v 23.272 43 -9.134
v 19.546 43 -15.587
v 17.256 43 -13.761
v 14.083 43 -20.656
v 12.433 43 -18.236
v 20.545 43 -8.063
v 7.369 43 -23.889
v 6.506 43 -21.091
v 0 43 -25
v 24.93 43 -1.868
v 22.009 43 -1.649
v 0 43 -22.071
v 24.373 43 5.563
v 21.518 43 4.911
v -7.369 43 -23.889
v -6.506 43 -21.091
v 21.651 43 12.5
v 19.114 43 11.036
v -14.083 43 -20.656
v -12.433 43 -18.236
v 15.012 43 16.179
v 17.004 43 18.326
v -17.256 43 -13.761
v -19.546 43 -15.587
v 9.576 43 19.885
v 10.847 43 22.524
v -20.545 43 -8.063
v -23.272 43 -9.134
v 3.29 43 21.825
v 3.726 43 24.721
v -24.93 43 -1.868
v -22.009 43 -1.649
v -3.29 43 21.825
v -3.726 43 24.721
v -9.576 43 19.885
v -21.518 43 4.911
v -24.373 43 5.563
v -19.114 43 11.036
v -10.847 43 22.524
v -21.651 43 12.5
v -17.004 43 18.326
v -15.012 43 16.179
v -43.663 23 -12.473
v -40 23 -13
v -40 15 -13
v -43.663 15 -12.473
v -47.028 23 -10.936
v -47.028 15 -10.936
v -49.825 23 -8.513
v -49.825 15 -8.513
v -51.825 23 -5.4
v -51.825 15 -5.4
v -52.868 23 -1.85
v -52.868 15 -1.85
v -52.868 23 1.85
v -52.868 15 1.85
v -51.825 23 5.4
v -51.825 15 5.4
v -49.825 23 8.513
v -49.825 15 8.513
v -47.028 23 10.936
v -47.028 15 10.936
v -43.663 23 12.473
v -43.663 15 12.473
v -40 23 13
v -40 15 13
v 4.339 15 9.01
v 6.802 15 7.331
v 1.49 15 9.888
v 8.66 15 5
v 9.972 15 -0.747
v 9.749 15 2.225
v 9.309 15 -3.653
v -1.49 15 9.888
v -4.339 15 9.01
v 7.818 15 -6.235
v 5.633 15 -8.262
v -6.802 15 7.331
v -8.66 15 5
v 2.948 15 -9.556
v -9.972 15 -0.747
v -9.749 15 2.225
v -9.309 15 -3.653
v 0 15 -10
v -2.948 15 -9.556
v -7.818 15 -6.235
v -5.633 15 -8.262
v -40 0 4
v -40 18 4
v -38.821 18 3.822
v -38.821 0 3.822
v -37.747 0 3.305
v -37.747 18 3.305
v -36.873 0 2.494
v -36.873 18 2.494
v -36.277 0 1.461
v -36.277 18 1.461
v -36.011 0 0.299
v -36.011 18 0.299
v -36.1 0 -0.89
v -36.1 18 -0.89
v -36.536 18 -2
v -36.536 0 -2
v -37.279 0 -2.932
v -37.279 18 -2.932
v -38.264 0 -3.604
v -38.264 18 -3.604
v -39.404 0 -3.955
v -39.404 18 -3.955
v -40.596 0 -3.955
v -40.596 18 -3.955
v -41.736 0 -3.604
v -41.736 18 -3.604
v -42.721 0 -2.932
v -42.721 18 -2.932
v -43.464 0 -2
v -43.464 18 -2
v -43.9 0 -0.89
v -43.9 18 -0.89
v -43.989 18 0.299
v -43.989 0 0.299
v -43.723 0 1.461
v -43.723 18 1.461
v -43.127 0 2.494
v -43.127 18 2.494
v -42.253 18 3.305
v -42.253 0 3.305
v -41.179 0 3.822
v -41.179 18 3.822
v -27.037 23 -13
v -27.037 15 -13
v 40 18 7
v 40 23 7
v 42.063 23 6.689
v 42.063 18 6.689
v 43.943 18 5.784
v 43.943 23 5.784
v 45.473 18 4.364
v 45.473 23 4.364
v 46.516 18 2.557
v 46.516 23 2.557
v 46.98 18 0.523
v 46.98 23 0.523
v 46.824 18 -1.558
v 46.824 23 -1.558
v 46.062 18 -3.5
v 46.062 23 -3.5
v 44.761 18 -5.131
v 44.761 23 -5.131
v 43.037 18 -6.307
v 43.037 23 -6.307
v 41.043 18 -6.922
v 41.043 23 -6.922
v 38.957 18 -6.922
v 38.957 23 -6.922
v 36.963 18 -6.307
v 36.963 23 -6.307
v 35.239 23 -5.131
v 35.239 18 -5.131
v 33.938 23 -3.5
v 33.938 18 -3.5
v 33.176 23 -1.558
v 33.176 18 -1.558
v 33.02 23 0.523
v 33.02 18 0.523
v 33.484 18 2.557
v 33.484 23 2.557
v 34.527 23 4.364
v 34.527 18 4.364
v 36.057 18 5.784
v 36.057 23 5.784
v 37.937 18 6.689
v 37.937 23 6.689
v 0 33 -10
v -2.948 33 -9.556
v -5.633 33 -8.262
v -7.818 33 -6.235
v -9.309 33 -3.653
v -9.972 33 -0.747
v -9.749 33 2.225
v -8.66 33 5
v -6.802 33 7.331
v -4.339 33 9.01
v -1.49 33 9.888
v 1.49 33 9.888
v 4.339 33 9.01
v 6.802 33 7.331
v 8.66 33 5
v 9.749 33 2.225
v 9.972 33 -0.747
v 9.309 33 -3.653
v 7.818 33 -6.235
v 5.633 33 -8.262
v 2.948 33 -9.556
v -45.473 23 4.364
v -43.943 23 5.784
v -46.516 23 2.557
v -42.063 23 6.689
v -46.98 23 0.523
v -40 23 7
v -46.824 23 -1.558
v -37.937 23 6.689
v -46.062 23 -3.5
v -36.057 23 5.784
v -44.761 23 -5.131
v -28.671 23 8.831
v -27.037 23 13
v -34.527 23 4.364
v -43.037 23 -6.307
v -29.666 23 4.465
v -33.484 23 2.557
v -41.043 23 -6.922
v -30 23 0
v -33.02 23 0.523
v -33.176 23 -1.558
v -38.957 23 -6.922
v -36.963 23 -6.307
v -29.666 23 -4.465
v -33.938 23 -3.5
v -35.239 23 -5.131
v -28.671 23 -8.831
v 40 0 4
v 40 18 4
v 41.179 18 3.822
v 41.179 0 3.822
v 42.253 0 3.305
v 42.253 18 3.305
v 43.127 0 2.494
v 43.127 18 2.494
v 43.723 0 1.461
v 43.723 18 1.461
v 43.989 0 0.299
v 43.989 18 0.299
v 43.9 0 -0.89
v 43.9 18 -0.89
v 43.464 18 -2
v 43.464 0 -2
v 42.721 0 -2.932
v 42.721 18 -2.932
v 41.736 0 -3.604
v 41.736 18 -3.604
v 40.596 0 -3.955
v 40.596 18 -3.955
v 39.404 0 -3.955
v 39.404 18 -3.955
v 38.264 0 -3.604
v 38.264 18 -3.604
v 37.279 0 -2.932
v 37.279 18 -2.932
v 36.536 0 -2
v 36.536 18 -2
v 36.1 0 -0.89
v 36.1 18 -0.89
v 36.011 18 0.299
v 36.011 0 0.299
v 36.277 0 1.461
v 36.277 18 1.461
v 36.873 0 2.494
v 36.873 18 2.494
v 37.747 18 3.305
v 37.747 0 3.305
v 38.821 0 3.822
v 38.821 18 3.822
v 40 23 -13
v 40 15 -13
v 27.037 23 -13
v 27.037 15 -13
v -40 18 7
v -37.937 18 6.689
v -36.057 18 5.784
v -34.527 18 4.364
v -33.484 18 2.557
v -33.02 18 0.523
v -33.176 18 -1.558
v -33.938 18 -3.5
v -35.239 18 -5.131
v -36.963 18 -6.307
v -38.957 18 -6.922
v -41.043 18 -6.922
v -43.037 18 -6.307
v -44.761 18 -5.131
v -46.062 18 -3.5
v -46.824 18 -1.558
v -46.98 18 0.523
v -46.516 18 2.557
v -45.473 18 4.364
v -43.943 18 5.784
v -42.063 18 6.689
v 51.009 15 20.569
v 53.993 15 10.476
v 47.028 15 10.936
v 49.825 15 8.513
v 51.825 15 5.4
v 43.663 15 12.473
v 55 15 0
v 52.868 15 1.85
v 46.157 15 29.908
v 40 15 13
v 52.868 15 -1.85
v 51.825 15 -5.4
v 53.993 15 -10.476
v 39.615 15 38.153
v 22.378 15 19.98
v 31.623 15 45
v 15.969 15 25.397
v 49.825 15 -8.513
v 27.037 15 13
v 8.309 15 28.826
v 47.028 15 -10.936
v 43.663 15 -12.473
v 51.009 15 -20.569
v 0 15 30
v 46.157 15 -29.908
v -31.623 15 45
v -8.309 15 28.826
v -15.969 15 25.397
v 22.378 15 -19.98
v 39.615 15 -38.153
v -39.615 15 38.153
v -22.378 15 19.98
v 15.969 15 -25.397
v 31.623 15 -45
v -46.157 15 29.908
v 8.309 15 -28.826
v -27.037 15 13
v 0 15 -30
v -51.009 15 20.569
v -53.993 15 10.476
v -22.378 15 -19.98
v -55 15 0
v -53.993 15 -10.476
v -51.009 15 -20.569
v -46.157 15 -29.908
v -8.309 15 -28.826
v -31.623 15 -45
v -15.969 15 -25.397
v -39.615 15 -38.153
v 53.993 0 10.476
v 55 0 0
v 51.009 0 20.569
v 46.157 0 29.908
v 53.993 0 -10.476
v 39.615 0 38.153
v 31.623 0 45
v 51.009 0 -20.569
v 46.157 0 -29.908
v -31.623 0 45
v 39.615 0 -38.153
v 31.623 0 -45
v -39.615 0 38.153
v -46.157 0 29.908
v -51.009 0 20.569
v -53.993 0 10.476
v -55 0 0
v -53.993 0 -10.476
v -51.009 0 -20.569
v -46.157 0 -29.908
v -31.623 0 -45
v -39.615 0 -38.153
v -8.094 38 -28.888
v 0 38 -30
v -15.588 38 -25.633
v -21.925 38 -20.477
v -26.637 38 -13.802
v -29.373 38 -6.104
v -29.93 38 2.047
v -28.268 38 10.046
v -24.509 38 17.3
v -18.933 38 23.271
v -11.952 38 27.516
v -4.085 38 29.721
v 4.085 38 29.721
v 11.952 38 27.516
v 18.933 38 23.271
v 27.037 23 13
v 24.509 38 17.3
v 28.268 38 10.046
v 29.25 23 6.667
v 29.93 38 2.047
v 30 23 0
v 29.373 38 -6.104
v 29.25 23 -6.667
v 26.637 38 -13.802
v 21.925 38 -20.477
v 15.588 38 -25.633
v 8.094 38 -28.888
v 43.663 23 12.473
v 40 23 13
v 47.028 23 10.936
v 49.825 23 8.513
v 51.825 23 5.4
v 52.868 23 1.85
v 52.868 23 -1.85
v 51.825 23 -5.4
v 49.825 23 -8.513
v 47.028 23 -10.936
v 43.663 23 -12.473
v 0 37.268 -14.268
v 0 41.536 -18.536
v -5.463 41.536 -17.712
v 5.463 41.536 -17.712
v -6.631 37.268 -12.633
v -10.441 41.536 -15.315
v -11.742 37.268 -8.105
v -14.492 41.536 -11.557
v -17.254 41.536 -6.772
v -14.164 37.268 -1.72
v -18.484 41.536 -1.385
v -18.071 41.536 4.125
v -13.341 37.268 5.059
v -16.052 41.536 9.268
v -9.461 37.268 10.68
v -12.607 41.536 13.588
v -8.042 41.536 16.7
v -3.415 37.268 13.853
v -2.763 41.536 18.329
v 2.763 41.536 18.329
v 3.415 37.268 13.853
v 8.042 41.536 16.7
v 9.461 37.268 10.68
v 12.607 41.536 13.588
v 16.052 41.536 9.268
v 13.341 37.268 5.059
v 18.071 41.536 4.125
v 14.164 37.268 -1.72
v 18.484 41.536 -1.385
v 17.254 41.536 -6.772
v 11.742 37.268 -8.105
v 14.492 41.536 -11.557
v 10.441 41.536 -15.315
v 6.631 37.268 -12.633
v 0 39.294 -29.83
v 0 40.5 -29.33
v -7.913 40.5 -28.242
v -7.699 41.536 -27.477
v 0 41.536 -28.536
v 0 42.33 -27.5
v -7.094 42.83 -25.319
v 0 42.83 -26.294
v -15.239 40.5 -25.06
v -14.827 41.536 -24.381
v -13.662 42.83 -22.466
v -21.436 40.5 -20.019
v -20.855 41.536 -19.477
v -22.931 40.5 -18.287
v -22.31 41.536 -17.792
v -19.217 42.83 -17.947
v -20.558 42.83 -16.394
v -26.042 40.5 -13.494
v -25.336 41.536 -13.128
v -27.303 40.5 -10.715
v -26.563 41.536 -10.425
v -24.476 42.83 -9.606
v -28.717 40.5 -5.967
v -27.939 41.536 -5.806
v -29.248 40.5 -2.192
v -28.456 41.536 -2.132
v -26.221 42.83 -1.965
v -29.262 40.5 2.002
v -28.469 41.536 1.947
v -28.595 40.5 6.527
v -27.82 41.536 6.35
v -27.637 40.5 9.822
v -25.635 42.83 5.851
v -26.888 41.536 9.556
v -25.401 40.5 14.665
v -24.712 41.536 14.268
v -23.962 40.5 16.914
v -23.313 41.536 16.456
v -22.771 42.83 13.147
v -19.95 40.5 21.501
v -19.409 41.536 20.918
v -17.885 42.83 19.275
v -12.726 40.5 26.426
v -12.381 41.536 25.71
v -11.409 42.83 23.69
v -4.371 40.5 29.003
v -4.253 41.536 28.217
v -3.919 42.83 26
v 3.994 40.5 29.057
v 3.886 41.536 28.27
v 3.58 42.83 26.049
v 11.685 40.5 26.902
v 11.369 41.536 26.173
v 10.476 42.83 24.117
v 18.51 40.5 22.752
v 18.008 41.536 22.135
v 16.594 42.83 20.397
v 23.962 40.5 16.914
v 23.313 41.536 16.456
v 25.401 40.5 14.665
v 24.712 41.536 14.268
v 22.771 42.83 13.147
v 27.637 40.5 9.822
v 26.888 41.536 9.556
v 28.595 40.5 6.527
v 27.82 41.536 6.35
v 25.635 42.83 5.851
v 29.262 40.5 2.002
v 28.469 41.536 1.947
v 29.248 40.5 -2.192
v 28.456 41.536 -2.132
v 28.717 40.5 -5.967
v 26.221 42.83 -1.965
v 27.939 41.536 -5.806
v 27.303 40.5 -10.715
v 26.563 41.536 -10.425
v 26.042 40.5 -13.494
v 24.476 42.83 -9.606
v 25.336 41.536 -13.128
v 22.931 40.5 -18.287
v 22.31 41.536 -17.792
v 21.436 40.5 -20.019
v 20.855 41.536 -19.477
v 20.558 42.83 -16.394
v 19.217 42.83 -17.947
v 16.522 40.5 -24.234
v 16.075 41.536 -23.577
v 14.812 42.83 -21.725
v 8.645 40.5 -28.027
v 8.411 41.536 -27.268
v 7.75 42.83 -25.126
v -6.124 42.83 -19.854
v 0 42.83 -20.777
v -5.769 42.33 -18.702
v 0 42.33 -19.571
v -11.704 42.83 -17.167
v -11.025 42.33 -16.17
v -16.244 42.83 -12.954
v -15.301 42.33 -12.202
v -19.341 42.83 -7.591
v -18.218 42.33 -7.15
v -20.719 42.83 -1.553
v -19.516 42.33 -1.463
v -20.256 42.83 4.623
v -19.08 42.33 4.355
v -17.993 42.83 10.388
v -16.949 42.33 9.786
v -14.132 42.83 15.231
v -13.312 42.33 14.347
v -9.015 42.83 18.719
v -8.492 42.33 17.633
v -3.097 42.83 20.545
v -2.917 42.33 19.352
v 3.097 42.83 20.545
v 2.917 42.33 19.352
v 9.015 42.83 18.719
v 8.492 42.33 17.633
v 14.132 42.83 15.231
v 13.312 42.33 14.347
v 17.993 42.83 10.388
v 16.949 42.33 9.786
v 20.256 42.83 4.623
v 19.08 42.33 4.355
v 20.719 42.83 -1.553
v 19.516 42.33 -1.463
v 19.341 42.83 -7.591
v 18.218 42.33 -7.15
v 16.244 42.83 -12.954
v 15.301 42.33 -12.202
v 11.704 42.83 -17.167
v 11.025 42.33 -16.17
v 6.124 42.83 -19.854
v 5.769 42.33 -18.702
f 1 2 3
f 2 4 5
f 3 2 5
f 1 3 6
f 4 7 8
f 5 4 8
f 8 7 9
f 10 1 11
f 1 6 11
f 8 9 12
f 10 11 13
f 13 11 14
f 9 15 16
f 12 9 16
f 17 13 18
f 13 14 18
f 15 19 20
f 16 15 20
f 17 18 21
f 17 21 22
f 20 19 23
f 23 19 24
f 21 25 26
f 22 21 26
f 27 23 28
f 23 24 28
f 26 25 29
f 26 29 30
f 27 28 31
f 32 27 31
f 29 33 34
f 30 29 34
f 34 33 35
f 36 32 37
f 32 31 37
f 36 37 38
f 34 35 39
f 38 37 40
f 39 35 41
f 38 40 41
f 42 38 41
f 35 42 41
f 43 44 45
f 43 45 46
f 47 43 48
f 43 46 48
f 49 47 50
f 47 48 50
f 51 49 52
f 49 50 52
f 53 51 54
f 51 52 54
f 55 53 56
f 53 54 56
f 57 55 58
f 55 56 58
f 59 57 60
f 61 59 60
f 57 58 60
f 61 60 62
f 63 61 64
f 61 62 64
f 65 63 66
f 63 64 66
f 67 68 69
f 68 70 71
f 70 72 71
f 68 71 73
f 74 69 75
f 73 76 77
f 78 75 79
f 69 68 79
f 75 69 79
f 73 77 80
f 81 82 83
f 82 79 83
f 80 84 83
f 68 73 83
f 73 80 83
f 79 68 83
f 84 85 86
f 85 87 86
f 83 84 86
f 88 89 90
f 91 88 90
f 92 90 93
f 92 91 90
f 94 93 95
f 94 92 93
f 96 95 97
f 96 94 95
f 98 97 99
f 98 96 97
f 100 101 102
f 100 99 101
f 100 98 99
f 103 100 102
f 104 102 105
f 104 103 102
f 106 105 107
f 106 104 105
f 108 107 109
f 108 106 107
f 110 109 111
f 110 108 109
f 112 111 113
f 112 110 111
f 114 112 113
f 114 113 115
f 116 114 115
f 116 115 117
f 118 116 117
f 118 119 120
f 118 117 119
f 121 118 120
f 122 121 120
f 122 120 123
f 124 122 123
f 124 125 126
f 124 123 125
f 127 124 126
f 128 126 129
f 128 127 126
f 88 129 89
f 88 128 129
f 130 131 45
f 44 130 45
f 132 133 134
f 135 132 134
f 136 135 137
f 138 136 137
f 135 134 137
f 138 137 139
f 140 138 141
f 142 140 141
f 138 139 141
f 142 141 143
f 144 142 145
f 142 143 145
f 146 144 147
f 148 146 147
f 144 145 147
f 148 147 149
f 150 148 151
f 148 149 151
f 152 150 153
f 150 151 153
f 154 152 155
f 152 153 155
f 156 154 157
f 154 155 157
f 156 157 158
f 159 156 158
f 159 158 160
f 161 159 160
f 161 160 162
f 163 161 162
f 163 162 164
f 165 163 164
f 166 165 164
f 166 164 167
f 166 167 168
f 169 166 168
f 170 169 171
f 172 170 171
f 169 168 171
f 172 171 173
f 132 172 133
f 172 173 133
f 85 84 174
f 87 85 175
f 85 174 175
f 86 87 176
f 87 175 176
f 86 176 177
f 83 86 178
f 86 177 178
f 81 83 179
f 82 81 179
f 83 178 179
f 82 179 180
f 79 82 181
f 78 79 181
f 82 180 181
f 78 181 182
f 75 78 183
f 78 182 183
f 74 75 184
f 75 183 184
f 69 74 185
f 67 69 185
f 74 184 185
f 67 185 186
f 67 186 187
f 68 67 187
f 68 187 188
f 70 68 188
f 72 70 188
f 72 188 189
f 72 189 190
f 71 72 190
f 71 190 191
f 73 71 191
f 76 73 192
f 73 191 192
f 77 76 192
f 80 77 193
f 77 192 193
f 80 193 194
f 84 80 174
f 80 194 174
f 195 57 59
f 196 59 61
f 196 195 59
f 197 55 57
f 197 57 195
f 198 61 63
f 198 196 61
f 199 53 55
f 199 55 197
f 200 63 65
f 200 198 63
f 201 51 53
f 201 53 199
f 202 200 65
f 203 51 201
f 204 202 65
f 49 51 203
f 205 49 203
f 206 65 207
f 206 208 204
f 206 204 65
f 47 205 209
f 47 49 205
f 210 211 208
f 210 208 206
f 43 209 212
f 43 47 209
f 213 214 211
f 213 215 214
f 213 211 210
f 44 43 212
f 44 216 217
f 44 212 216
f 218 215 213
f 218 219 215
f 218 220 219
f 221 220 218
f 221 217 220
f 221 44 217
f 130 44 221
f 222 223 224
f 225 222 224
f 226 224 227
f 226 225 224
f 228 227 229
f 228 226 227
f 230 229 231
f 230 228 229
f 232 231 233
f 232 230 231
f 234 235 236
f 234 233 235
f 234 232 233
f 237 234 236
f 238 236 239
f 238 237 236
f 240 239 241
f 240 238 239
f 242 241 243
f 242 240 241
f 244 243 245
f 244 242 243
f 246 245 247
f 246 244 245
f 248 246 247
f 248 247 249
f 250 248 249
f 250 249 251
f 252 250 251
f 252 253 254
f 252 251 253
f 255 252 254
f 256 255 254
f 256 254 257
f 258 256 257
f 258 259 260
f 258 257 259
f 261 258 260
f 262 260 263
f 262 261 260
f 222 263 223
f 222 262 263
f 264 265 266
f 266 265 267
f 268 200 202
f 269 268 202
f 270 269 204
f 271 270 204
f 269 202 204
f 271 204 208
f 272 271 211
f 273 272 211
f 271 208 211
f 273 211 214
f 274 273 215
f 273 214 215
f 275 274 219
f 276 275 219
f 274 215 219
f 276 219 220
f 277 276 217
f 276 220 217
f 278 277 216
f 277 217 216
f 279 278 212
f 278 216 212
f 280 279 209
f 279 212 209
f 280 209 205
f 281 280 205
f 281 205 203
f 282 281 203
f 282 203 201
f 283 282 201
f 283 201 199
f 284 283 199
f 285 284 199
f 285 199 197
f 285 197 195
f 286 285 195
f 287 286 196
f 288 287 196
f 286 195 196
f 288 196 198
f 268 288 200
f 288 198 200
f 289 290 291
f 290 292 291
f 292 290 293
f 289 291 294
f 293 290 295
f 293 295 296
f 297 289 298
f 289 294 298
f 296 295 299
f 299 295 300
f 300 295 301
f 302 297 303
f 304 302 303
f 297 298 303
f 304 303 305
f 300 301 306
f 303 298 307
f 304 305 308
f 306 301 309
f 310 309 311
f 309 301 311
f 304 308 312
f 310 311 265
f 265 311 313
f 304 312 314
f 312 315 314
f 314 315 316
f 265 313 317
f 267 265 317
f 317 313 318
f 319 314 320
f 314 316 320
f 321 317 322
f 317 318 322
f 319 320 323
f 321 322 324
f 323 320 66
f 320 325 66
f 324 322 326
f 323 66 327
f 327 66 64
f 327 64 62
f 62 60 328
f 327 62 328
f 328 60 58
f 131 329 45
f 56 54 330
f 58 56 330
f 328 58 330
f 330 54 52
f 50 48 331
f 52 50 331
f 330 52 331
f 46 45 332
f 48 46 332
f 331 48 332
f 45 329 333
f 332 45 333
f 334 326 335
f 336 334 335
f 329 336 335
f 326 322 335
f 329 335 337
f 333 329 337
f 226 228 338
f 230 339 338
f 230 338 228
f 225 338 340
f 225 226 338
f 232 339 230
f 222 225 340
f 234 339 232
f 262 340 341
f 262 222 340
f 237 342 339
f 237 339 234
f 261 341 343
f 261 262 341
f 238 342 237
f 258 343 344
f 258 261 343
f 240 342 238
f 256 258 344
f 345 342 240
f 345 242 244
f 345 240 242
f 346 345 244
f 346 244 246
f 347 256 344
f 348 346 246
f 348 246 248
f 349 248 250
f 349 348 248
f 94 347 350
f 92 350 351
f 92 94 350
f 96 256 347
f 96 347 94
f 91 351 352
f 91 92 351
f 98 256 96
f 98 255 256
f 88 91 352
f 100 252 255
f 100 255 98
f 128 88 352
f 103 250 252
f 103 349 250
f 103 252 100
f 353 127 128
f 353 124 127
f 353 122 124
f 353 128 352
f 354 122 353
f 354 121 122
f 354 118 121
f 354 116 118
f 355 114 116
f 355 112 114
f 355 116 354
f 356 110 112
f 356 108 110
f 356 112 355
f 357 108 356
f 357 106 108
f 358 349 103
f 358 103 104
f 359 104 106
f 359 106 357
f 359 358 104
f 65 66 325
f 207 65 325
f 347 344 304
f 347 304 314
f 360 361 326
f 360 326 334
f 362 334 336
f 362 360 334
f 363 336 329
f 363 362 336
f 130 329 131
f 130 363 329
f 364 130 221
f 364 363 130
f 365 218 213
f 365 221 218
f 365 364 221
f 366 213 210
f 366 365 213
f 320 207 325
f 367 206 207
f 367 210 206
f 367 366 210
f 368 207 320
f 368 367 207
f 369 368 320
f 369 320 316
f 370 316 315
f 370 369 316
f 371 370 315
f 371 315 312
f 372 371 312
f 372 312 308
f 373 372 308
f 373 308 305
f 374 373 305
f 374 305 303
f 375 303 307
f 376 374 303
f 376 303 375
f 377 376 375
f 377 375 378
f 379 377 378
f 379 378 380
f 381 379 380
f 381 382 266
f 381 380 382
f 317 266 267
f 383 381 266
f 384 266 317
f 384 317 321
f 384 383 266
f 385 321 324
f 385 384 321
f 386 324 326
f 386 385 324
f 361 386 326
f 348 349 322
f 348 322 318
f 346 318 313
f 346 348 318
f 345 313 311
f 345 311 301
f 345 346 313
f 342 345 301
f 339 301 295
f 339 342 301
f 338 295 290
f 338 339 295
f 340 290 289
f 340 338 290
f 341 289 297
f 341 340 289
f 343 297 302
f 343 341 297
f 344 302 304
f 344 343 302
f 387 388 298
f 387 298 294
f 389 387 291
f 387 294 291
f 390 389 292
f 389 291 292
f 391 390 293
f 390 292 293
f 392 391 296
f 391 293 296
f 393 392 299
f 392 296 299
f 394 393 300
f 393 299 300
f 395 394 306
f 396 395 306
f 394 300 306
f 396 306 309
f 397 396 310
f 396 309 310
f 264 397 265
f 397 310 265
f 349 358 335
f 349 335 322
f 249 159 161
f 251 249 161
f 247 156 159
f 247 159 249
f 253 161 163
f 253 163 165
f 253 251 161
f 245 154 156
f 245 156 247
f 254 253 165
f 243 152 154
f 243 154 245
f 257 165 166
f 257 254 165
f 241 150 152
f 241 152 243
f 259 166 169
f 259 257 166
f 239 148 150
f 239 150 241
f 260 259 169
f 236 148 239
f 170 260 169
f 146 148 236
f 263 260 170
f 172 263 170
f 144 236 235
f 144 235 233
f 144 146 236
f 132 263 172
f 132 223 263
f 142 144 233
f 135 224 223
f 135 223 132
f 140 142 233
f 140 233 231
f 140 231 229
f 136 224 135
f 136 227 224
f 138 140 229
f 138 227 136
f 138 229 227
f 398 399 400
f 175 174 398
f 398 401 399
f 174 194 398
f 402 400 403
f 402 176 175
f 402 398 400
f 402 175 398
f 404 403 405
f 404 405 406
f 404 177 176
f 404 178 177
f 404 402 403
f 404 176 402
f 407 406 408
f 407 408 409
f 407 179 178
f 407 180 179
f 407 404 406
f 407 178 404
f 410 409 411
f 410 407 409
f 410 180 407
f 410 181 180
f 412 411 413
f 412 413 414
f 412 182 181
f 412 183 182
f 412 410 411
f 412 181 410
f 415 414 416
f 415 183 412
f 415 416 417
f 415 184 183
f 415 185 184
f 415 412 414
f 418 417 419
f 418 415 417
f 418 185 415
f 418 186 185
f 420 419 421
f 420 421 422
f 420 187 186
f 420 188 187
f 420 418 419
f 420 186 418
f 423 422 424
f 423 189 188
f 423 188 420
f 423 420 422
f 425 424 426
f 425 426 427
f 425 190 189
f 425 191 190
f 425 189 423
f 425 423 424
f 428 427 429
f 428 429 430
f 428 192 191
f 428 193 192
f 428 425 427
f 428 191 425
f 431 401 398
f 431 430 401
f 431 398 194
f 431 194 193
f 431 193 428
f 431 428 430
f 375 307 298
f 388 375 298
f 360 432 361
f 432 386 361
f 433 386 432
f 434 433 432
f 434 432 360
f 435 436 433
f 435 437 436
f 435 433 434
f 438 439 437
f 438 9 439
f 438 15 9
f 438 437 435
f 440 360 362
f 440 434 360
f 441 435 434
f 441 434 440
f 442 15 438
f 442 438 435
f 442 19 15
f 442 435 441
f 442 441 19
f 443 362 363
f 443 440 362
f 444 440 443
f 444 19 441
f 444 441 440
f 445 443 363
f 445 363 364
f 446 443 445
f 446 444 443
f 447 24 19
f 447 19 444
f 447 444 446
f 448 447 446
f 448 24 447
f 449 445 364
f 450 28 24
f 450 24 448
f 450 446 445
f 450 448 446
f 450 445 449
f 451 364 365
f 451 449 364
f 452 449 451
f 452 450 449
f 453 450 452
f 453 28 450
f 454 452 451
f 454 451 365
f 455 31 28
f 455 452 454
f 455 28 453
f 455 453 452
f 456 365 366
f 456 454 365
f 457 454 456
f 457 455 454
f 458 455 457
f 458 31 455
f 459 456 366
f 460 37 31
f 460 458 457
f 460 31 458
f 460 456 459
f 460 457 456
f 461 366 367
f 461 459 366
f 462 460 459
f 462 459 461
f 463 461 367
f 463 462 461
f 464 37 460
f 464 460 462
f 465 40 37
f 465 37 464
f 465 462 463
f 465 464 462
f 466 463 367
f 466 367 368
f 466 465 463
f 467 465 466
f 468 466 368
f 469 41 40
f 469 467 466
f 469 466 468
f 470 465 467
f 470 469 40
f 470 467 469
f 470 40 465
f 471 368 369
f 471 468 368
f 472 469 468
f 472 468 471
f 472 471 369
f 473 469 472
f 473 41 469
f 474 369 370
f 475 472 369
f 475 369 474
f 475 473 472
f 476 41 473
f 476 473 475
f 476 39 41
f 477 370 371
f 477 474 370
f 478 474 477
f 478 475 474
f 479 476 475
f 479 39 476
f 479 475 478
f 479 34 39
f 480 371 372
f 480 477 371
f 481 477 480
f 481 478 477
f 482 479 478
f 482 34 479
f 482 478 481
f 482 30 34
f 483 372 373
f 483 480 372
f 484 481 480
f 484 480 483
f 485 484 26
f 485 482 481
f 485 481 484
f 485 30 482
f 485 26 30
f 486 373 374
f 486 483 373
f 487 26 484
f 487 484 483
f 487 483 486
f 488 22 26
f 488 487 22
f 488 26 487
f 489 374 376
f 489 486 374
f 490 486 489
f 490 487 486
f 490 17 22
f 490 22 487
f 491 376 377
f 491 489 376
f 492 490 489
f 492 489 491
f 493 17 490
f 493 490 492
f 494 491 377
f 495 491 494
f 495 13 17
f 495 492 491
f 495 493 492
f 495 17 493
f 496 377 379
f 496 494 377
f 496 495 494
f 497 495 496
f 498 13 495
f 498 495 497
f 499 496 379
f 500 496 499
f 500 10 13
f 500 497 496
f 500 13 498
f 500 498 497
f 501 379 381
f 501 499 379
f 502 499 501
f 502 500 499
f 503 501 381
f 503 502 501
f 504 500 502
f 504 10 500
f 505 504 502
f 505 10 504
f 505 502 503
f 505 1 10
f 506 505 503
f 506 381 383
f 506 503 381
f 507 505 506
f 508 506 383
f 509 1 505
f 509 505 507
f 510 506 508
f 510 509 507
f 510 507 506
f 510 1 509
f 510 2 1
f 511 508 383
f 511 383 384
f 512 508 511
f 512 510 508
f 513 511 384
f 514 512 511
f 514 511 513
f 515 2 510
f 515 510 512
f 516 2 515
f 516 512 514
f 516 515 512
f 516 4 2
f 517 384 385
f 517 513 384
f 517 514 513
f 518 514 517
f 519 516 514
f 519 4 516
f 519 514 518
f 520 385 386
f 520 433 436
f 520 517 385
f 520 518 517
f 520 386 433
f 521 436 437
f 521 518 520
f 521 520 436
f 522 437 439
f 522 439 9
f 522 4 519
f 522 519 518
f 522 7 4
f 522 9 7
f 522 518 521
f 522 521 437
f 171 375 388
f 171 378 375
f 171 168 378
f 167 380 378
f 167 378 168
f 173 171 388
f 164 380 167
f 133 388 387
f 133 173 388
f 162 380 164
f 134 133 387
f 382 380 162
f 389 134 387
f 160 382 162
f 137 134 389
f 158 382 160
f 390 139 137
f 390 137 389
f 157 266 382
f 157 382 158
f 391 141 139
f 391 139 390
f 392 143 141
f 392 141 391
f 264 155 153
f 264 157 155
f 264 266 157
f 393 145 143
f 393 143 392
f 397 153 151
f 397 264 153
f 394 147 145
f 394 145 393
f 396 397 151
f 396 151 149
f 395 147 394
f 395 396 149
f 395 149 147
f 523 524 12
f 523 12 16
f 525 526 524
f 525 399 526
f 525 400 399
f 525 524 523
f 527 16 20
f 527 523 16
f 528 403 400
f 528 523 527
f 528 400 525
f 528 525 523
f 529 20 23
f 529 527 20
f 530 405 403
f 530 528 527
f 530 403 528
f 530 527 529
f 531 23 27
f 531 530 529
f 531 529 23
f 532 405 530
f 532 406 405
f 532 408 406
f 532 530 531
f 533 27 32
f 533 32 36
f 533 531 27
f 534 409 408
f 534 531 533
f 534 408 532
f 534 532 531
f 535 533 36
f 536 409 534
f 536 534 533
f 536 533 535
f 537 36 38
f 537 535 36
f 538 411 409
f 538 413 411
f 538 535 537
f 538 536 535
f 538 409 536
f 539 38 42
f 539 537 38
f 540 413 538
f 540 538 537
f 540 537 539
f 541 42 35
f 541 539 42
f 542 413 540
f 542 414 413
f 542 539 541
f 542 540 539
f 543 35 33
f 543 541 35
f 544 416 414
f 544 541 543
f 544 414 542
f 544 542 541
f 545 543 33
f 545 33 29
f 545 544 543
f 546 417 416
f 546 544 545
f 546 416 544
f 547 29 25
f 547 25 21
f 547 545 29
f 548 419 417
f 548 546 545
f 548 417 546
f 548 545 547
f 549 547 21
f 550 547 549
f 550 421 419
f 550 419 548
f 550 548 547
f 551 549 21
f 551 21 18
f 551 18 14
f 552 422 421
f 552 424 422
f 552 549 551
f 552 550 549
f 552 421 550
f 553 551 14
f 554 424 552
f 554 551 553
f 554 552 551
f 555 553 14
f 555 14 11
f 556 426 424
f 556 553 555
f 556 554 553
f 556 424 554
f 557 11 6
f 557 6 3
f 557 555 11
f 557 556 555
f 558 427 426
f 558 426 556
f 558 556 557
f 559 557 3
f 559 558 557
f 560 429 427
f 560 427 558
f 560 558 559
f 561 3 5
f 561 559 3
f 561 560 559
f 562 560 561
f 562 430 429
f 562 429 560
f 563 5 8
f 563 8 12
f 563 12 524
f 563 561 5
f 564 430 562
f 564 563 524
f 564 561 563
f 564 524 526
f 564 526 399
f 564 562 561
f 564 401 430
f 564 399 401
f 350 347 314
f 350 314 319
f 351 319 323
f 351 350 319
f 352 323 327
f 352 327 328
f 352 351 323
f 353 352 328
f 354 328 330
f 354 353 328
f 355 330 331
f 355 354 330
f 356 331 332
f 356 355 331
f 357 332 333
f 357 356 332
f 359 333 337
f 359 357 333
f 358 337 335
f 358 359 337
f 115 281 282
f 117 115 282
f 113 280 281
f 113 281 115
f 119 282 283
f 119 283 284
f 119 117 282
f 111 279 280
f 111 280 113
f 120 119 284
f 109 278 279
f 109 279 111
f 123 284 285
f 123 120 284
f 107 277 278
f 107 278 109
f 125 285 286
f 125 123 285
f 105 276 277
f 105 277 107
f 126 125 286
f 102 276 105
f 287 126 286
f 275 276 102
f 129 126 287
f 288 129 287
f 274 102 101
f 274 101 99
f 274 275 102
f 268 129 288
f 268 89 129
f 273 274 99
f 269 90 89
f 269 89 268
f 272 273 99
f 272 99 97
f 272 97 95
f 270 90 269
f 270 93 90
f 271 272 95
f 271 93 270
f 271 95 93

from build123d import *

# Parameters (mm, degrees)
EXTRUDE_1_DEPTH          = 15
SKETCH_9_W               = 10
SKETCH_9_H               = 33
SKETCH_12_W              = 10
SKETCH_12_H              = 28
FILLET_1_R               = 5
EXTRUDE_4_DEPTH          = 8
SKETCH_17_R              = 7
CUT_EXTRUDE_1_DEPTH      = 5
CUT_EXTRUDE_2_DEPTH      = 75.692703794
CUT_EXTRUDE_2_DEPTH_BACK = 75.692703794
SKETCH_18_R              = 4


with BuildPart() as part:
    # 草图1 → 凸台-拉伸1 (new body)
    with BuildSketch(Plane(origin=(0, 0, 0), x_dir=(1, 0, 0), z_dir=(0, 1, 0))):
        with BuildLine():
            Line((-31.622776602, 45), (31.622776602, 45))
            ThreePointArc((31.622776602, 45), (55, 0), (31.622776602, -45))
            Line((31.622776602, -45), (-31.622776602, -45))
            ThreePointArc((-31.622776602, -45), (-55, 0), (-31.622776602, 45))
        make_face()
    extrude(amount=EXTRUDE_1_DEPTH)

    # 草图9 → 旋转1 (revolve)
    with BuildSketch(Plane.XY, mode=Mode.PRIVATE) as revolve_1_sk:
        Polygon((20, 33), (20, 43), (10, 33), align=None)
        with Locations((15, 16.5)):
            Rectangle(SKETCH_9_W, SKETCH_9_H)
    revolve(revolve_1_sk.sketch.rotate(Axis((0, 0, 0), (0, 1, 0)), 90), axis=Axis((0, 0, 0), (0, 1, 0)))

    # 草图12 → 旋转2 (revolve)
    with BuildSketch(Plane.XY, mode=Mode.PRIVATE) as revolve_2_sk:
        with Locations((25, 29)):
            Rectangle(SKETCH_12_W, SKETCH_12_H)
    revolve(revolve_2_sk.sketch.rotate(Axis((0, 0, 0), (0, 1, 0)), 90), axis=Axis((0, 0, 0), (0, 1, 0)))

    # 圆角1
    fillet_1_edges = [part.edges().sort_by_distance(p)[0] for p in [
        (0, 43, 20),
        (0, 43, 30),
    ]]
    fillet(fillet_1_edges, radius=FILLET_1_R)

    # 草图14 → 凸台-拉伸4 (add)
    with BuildSketch(Plane(origin=(0, 15, 0), x_dir=(1, 0, 0), z_dir=(0, 1, 0))):
        with BuildLine():
            Line((-27.037011669, 13), (-40, 13))
            ThreePointArc((-40, 13), (-53, 0), (-40, -13))
            Line((-40, -13), (-27.037011669, -13))
            ThreePointArc((-27.037011669, -13), (-29.249874787, -6.666695205), (-30, 0))
            ThreePointArc((-30, 0), (-29.249874787, 6.666695205), (-27.037011669, 13))
        make_face()
        with BuildLine():
            Line((27.037011669, -13), (40, -13))
            ThreePointArc((40, -13), (53, 0), (40, 13))
            Line((40, 13), (27.037011669, 13))
            ThreePointArc((27.037011669, 13), (30, 0), (27.037011669, -13))
        make_face()
    extrude(amount=EXTRUDE_4_DEPTH)

    # 草图17 → 切除-拉伸1 (cut)
    with BuildSketch(Plane(origin=(0, 23, 0), x_dir=(1, 0, 0), z_dir=(0, 1, 0))):
        with Locations(Location((-40, 0, 0), (0, 0, 270))):
            Circle(SKETCH_17_R)
        with Locations(Location((40, 0, 0), (0, 0, 270))):
            Circle(SKETCH_17_R)
    extrude(amount=-CUT_EXTRUDE_1_DEPTH, mode=Mode.SUBTRACT)

    # 草图18 → 切除-拉伸2 (cut, two sides: drawn at the far end of the back side and taken through both)
    with BuildSketch(Plane(origin=(0, 23, 0), x_dir=(1, 0, 0), z_dir=(0, 1, 0)).offset(-CUT_EXTRUDE_2_DEPTH_BACK)):
        with Locations(Location((-40, 0, 0), (0, 0, 270))):
            Circle(SKETCH_18_R)
        with Locations(Location((40, 0, 0), (0, 0, 270))):
            Circle(SKETCH_18_R)
    extrude(amount=CUT_EXTRUDE_2_DEPTH + CUT_EXTRUDE_2_DEPTH_BACK, mode=Mode.SUBTRACT)


solid = part.part
